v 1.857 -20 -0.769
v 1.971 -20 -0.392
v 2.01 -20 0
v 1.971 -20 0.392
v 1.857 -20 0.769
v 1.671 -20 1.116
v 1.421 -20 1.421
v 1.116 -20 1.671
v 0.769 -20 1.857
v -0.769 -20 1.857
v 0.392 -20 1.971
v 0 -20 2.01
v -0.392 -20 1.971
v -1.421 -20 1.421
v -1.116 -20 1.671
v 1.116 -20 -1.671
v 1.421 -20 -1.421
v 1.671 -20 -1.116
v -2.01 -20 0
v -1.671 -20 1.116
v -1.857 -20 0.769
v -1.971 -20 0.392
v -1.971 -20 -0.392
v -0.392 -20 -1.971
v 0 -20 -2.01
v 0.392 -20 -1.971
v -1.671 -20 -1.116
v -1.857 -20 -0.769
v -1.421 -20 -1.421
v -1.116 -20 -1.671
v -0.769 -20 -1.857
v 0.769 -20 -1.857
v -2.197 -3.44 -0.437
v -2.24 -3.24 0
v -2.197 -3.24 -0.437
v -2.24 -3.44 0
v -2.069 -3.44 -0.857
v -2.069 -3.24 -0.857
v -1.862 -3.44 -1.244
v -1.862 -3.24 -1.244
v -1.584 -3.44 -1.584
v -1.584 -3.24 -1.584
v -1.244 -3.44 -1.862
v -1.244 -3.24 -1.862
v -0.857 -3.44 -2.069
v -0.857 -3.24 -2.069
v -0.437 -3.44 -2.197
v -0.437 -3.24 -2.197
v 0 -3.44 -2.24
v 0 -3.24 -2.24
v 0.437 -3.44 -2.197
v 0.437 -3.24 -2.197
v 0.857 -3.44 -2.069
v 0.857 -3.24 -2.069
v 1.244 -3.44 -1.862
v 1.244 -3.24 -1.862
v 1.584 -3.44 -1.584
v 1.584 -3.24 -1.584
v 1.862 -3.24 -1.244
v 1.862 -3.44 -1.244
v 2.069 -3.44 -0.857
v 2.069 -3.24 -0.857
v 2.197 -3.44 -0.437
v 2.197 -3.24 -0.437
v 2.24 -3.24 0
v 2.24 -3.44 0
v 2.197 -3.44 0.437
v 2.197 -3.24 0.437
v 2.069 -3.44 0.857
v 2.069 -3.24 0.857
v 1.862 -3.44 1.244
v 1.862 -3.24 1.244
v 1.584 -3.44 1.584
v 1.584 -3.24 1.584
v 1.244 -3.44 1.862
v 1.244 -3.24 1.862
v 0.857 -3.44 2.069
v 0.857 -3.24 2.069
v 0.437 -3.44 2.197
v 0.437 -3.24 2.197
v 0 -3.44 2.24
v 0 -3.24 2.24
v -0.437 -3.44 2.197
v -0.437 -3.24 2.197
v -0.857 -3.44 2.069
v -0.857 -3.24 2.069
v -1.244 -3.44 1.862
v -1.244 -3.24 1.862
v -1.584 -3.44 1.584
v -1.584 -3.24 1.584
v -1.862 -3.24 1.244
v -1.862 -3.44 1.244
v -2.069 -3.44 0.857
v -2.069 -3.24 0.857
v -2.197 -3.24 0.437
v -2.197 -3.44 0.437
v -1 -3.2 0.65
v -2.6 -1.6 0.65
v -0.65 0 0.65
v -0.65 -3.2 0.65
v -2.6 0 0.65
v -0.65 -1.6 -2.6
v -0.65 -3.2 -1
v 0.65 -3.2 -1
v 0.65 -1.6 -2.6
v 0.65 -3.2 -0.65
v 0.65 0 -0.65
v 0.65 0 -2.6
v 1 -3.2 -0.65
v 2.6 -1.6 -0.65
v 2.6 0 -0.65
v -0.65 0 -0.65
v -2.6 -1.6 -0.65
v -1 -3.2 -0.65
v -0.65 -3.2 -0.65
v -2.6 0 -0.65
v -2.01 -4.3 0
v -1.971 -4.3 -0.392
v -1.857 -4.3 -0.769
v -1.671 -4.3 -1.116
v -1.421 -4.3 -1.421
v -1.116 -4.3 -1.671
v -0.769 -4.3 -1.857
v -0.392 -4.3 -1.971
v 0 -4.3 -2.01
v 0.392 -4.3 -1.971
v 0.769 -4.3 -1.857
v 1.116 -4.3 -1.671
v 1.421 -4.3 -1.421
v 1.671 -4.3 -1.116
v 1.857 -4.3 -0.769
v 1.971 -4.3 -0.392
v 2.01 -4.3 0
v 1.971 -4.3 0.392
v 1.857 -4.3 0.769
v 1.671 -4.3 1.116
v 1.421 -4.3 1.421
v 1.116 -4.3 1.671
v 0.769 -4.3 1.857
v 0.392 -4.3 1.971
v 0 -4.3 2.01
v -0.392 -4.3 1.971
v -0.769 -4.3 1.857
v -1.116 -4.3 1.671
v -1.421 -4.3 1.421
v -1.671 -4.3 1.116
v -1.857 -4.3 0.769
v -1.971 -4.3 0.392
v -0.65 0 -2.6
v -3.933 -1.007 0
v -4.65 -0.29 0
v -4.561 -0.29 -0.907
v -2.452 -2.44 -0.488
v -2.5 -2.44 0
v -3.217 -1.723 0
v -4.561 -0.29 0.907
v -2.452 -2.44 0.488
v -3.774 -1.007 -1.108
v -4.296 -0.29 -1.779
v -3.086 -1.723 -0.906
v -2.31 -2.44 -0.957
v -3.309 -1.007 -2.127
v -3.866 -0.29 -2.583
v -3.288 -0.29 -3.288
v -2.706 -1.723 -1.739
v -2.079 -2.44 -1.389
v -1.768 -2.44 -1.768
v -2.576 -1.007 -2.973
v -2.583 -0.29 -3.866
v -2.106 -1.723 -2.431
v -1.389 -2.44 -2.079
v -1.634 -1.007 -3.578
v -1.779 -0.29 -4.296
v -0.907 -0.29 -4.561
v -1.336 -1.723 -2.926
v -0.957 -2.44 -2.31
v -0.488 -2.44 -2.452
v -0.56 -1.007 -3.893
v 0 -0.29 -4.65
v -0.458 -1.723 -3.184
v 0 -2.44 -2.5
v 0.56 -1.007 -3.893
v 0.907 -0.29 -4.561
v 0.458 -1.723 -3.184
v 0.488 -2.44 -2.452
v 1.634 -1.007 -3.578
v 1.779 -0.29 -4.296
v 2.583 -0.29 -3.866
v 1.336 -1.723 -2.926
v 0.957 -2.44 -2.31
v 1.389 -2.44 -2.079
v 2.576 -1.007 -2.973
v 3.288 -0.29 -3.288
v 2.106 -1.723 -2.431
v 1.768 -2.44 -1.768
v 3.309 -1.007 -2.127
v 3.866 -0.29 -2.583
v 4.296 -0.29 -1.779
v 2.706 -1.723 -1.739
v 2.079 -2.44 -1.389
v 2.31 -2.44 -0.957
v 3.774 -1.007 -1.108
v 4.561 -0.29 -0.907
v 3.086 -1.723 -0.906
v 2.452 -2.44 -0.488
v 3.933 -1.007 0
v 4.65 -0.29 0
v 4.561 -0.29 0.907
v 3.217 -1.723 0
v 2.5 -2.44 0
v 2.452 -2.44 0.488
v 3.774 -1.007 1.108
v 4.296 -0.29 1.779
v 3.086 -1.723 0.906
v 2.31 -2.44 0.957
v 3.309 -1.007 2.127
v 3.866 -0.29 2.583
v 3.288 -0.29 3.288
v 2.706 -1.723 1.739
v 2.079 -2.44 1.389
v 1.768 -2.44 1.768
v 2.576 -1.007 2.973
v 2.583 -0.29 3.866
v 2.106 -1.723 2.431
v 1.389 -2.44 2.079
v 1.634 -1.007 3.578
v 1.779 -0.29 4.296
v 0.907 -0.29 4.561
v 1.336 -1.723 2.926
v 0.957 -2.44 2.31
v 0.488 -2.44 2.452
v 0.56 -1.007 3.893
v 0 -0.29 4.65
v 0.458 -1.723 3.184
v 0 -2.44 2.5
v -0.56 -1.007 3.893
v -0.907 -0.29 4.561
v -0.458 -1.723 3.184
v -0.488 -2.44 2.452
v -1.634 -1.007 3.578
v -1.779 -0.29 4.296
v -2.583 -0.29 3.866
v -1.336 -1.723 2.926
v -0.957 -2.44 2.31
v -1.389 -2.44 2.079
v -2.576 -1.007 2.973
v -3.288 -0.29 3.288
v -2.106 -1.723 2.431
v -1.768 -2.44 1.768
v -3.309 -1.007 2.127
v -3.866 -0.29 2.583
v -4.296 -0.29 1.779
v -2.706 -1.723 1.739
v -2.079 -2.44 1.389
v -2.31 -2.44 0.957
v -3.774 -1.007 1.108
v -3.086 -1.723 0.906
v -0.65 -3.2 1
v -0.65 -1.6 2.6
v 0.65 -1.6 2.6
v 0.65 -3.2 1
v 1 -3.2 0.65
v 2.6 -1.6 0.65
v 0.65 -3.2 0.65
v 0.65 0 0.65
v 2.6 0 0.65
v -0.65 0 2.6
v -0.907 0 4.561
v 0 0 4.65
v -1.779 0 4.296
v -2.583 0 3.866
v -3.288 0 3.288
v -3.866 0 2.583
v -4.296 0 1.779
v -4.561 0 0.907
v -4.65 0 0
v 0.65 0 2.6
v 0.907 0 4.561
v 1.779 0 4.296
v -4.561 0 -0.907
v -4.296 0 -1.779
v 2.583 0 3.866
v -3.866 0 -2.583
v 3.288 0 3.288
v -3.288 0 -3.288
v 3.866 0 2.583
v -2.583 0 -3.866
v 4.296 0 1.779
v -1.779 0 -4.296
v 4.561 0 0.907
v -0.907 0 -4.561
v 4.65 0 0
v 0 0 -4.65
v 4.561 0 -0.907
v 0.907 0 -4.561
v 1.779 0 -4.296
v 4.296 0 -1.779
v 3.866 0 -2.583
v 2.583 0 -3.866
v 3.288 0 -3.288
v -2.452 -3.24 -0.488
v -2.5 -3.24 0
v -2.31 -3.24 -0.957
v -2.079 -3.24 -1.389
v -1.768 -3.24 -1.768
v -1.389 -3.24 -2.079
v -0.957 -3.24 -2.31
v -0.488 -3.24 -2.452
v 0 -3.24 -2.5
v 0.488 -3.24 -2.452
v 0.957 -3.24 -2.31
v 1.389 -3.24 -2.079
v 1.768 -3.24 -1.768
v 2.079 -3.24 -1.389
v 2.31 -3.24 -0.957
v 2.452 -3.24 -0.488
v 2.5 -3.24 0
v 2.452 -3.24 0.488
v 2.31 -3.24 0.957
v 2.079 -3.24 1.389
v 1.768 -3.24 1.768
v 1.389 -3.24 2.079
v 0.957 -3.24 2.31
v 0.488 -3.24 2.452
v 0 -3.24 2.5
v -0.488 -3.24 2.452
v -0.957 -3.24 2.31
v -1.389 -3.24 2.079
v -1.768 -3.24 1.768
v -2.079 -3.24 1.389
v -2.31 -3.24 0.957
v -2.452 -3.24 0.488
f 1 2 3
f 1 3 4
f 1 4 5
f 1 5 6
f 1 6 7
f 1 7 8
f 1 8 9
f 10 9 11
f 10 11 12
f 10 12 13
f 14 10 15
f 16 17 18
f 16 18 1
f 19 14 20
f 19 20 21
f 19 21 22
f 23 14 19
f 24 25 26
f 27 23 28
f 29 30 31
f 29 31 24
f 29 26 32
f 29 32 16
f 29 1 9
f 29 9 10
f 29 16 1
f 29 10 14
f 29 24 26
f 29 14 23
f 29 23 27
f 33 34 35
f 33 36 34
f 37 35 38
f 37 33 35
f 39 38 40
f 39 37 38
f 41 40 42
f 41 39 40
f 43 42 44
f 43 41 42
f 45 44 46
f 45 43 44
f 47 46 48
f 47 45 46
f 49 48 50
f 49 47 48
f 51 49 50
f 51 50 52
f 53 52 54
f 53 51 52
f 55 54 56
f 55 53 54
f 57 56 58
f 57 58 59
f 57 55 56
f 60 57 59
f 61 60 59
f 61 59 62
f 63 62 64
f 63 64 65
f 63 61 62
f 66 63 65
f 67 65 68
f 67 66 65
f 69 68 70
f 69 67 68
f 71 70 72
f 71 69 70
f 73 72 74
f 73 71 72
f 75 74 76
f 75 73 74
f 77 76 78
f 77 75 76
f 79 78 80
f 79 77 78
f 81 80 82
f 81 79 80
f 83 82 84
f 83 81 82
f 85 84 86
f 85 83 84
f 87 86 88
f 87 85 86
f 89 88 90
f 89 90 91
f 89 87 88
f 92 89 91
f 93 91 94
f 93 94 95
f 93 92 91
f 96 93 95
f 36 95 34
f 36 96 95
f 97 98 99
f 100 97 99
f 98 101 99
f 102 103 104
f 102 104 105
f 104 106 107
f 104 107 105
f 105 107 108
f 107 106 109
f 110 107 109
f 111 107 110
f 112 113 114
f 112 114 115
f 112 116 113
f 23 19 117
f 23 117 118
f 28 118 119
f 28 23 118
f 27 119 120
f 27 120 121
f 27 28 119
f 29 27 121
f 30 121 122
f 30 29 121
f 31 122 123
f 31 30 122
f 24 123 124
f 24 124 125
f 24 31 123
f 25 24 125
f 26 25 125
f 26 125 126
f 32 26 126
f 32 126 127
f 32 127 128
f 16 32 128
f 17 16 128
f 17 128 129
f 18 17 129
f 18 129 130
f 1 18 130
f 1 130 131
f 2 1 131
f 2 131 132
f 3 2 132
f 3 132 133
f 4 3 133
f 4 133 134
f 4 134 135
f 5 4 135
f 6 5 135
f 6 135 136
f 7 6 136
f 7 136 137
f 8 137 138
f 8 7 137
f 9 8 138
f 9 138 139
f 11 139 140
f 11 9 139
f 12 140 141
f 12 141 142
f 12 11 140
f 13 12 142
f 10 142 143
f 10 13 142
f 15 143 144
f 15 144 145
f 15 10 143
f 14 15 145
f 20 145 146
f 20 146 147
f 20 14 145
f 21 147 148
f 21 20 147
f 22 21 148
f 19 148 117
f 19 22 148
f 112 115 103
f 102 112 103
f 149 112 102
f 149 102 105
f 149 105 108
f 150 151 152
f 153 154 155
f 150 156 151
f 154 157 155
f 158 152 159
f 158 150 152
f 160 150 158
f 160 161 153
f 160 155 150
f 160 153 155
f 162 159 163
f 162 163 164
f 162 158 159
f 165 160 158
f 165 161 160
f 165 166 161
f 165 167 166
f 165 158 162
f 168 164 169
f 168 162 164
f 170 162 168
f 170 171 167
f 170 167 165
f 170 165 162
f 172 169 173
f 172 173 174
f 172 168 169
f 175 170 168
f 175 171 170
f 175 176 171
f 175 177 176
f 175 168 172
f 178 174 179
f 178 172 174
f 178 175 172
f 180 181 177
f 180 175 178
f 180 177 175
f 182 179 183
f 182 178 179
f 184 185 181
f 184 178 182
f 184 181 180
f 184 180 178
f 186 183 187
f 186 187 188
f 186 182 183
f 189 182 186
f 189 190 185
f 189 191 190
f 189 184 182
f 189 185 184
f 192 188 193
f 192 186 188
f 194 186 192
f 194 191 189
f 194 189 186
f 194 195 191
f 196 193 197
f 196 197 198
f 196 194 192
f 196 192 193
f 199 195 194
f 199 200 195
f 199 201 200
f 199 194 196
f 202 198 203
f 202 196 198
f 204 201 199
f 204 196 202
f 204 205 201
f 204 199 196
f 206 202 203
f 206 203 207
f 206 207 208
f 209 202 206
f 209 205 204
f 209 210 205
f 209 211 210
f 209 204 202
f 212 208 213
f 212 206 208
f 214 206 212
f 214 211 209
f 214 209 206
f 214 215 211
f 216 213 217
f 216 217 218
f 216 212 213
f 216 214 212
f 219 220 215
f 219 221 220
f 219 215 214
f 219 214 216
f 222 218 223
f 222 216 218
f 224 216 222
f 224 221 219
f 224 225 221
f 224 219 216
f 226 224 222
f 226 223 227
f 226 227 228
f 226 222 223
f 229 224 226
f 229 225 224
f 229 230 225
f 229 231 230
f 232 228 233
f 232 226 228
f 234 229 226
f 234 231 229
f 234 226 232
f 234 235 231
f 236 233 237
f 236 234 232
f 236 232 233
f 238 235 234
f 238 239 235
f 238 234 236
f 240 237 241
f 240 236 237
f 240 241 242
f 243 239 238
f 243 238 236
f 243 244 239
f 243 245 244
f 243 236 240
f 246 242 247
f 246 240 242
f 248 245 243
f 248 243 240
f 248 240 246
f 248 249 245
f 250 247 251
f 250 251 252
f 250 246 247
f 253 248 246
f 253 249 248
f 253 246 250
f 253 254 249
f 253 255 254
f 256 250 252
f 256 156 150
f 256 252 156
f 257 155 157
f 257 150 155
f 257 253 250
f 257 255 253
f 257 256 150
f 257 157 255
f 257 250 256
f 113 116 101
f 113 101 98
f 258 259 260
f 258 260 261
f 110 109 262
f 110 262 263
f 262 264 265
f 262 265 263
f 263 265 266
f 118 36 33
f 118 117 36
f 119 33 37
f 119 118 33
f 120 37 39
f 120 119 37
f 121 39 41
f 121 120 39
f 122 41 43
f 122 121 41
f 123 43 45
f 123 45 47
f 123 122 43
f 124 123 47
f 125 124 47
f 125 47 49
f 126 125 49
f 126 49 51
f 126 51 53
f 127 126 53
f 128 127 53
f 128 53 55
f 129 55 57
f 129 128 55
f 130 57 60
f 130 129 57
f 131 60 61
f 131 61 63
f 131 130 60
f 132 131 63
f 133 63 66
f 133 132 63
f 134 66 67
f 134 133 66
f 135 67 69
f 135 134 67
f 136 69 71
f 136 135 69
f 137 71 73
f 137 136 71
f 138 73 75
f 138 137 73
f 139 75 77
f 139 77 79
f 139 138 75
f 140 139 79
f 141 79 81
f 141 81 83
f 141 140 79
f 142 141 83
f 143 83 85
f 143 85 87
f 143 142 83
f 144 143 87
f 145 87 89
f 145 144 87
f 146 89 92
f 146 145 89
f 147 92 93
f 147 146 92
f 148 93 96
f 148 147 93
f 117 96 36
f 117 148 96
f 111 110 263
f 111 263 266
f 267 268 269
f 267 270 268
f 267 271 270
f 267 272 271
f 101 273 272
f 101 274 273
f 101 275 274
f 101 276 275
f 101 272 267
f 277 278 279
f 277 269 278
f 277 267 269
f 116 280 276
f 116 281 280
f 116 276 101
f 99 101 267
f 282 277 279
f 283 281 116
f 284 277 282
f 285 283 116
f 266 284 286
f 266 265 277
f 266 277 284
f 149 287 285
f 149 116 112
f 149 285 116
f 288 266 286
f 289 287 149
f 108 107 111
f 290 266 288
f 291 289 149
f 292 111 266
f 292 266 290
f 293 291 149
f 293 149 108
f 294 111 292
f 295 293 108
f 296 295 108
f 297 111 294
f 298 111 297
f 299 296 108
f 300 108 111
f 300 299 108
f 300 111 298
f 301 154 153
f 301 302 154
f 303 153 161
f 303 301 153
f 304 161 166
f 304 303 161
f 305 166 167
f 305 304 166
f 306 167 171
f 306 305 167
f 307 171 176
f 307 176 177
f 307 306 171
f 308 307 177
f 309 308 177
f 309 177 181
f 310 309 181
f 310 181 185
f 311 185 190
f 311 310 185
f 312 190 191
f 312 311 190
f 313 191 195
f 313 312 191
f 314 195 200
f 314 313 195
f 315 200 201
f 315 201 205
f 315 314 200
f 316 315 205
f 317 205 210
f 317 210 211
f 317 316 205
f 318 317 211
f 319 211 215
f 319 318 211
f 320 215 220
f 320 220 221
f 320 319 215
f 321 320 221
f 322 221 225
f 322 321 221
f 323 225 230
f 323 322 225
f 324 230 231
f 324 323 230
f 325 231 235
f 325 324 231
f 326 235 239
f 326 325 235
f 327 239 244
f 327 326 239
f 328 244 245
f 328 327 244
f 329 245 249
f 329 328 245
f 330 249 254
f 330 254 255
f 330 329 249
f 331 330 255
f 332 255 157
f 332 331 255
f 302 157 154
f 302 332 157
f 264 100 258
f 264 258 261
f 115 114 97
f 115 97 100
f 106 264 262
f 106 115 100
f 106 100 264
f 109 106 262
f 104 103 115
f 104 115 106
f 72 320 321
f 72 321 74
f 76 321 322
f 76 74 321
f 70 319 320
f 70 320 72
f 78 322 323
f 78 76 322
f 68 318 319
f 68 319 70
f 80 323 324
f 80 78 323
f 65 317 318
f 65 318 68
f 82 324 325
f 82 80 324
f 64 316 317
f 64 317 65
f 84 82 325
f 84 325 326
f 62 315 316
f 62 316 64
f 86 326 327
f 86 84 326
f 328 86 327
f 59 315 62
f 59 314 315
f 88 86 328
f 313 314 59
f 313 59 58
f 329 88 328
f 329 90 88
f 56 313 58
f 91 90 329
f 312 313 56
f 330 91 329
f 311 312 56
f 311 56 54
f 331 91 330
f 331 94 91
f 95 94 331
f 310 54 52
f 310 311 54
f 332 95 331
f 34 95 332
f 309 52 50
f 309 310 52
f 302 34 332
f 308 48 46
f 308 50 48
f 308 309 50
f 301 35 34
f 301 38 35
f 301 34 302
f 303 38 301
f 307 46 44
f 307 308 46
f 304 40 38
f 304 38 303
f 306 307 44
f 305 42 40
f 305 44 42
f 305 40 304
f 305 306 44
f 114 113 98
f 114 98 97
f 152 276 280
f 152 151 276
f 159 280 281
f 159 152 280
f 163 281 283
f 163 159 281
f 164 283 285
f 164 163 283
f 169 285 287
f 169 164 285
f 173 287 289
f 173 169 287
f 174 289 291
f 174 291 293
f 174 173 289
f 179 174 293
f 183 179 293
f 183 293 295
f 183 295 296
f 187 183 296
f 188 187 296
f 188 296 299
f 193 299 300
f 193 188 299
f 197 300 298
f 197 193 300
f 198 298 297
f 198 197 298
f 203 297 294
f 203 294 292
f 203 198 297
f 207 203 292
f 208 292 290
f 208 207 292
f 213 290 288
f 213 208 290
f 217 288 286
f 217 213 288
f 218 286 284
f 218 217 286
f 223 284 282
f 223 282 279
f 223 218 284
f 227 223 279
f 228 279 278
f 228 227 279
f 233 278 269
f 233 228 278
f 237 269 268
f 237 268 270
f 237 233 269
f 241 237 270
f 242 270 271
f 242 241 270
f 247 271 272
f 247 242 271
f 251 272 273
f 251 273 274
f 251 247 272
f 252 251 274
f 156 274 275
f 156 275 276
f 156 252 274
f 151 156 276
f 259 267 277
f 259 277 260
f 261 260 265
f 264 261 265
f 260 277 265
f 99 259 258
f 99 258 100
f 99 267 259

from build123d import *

# Parameters (mm, degrees)
KREUZSCHLITZ1_H_DEPTH      = 0.65
KREUZSCHLITZ1_H_DEPTH_BACK = 0.65
KREUZSCHLITZ2_H_DEPTH      = 0.65
KREUZSCHLITZ2_H_DEPTH_BACK = 0.65
BOSS_EXTRUDE1_START        = 4
SKETCH1_R                  = 2.0095
BOSS_EXTRUDE1_DEPTH        = 4


with BuildPart() as part:
    # Skizze1 → Basis-Rotation (revolve)
    with BuildSketch(Plane.XY, mode=Mode.PRIVATE) as basis_rotation_sk:
        Polygon((0, 0), (4.65, 0), (4.65, -0.29), (2.5, -2.44), (2.5, -3.24), (2.24, -3.24), (2.24, -3.439762289), (2.0095, -4.3), (2.0095, -16), (0, -16), align=None)
    revolve(basis_rotation_sk.sketch.rotate(Axis((0, 0, 0), (0, -1, 0)), 180), axis=Axis((0, 0, 0), (0, -1, 0)))

    # Skizze2 → Kreuzschlitz1 H (cut, two sides: drawn at the far end of the back side and taken through both)
    with BuildSketch(Plane.XY.offset(-KREUZSCHLITZ1_H_DEPTH_BACK)):
        Polygon((-1, -3.2), (1, -3.2), (2.6, -1.6), (2.6, 0), (-2.6, 0), (-2.6, -1.6), align=None)
    extrude(amount=KREUZSCHLITZ1_H_DEPTH + KREUZSCHLITZ1_H_DEPTH_BACK, mode=Mode.SUBTRACT)

    # Skizze3 → Kreuzschlitz2 H (cut, two sides: drawn at the far end of the back side and taken through both)
    with BuildSketch(Plane(origin=(0, 0, 0), x_dir=(0, 0, -1), z_dir=(1, 0, 0)).offset(-KREUZSCHLITZ2_H_DEPTH_BACK)):
        Polygon((-1, -3.2), (1, -3.2), (2.6, -1.6), (2.6, 0), (-2.6, 0), (-2.6, -1.6), align=None)
    extrude(amount=KREUZSCHLITZ2_H_DEPTH + KREUZSCHLITZ2_H_DEPTH_BACK, mode=Mode.SUBTRACT)

    # Sketch1 → Boss-Extrude1 (add)
    with BuildSketch(Plane.XZ.offset(16).offset(BOSS_EXTRUDE1_START)):
        with Locations(Location((0, 0, 0), (0, 0, 180))):
            Circle(SKETCH1_R)
    extrude(amount=-BOSS_EXTRUDE1_DEPTH)


solid = part.part
